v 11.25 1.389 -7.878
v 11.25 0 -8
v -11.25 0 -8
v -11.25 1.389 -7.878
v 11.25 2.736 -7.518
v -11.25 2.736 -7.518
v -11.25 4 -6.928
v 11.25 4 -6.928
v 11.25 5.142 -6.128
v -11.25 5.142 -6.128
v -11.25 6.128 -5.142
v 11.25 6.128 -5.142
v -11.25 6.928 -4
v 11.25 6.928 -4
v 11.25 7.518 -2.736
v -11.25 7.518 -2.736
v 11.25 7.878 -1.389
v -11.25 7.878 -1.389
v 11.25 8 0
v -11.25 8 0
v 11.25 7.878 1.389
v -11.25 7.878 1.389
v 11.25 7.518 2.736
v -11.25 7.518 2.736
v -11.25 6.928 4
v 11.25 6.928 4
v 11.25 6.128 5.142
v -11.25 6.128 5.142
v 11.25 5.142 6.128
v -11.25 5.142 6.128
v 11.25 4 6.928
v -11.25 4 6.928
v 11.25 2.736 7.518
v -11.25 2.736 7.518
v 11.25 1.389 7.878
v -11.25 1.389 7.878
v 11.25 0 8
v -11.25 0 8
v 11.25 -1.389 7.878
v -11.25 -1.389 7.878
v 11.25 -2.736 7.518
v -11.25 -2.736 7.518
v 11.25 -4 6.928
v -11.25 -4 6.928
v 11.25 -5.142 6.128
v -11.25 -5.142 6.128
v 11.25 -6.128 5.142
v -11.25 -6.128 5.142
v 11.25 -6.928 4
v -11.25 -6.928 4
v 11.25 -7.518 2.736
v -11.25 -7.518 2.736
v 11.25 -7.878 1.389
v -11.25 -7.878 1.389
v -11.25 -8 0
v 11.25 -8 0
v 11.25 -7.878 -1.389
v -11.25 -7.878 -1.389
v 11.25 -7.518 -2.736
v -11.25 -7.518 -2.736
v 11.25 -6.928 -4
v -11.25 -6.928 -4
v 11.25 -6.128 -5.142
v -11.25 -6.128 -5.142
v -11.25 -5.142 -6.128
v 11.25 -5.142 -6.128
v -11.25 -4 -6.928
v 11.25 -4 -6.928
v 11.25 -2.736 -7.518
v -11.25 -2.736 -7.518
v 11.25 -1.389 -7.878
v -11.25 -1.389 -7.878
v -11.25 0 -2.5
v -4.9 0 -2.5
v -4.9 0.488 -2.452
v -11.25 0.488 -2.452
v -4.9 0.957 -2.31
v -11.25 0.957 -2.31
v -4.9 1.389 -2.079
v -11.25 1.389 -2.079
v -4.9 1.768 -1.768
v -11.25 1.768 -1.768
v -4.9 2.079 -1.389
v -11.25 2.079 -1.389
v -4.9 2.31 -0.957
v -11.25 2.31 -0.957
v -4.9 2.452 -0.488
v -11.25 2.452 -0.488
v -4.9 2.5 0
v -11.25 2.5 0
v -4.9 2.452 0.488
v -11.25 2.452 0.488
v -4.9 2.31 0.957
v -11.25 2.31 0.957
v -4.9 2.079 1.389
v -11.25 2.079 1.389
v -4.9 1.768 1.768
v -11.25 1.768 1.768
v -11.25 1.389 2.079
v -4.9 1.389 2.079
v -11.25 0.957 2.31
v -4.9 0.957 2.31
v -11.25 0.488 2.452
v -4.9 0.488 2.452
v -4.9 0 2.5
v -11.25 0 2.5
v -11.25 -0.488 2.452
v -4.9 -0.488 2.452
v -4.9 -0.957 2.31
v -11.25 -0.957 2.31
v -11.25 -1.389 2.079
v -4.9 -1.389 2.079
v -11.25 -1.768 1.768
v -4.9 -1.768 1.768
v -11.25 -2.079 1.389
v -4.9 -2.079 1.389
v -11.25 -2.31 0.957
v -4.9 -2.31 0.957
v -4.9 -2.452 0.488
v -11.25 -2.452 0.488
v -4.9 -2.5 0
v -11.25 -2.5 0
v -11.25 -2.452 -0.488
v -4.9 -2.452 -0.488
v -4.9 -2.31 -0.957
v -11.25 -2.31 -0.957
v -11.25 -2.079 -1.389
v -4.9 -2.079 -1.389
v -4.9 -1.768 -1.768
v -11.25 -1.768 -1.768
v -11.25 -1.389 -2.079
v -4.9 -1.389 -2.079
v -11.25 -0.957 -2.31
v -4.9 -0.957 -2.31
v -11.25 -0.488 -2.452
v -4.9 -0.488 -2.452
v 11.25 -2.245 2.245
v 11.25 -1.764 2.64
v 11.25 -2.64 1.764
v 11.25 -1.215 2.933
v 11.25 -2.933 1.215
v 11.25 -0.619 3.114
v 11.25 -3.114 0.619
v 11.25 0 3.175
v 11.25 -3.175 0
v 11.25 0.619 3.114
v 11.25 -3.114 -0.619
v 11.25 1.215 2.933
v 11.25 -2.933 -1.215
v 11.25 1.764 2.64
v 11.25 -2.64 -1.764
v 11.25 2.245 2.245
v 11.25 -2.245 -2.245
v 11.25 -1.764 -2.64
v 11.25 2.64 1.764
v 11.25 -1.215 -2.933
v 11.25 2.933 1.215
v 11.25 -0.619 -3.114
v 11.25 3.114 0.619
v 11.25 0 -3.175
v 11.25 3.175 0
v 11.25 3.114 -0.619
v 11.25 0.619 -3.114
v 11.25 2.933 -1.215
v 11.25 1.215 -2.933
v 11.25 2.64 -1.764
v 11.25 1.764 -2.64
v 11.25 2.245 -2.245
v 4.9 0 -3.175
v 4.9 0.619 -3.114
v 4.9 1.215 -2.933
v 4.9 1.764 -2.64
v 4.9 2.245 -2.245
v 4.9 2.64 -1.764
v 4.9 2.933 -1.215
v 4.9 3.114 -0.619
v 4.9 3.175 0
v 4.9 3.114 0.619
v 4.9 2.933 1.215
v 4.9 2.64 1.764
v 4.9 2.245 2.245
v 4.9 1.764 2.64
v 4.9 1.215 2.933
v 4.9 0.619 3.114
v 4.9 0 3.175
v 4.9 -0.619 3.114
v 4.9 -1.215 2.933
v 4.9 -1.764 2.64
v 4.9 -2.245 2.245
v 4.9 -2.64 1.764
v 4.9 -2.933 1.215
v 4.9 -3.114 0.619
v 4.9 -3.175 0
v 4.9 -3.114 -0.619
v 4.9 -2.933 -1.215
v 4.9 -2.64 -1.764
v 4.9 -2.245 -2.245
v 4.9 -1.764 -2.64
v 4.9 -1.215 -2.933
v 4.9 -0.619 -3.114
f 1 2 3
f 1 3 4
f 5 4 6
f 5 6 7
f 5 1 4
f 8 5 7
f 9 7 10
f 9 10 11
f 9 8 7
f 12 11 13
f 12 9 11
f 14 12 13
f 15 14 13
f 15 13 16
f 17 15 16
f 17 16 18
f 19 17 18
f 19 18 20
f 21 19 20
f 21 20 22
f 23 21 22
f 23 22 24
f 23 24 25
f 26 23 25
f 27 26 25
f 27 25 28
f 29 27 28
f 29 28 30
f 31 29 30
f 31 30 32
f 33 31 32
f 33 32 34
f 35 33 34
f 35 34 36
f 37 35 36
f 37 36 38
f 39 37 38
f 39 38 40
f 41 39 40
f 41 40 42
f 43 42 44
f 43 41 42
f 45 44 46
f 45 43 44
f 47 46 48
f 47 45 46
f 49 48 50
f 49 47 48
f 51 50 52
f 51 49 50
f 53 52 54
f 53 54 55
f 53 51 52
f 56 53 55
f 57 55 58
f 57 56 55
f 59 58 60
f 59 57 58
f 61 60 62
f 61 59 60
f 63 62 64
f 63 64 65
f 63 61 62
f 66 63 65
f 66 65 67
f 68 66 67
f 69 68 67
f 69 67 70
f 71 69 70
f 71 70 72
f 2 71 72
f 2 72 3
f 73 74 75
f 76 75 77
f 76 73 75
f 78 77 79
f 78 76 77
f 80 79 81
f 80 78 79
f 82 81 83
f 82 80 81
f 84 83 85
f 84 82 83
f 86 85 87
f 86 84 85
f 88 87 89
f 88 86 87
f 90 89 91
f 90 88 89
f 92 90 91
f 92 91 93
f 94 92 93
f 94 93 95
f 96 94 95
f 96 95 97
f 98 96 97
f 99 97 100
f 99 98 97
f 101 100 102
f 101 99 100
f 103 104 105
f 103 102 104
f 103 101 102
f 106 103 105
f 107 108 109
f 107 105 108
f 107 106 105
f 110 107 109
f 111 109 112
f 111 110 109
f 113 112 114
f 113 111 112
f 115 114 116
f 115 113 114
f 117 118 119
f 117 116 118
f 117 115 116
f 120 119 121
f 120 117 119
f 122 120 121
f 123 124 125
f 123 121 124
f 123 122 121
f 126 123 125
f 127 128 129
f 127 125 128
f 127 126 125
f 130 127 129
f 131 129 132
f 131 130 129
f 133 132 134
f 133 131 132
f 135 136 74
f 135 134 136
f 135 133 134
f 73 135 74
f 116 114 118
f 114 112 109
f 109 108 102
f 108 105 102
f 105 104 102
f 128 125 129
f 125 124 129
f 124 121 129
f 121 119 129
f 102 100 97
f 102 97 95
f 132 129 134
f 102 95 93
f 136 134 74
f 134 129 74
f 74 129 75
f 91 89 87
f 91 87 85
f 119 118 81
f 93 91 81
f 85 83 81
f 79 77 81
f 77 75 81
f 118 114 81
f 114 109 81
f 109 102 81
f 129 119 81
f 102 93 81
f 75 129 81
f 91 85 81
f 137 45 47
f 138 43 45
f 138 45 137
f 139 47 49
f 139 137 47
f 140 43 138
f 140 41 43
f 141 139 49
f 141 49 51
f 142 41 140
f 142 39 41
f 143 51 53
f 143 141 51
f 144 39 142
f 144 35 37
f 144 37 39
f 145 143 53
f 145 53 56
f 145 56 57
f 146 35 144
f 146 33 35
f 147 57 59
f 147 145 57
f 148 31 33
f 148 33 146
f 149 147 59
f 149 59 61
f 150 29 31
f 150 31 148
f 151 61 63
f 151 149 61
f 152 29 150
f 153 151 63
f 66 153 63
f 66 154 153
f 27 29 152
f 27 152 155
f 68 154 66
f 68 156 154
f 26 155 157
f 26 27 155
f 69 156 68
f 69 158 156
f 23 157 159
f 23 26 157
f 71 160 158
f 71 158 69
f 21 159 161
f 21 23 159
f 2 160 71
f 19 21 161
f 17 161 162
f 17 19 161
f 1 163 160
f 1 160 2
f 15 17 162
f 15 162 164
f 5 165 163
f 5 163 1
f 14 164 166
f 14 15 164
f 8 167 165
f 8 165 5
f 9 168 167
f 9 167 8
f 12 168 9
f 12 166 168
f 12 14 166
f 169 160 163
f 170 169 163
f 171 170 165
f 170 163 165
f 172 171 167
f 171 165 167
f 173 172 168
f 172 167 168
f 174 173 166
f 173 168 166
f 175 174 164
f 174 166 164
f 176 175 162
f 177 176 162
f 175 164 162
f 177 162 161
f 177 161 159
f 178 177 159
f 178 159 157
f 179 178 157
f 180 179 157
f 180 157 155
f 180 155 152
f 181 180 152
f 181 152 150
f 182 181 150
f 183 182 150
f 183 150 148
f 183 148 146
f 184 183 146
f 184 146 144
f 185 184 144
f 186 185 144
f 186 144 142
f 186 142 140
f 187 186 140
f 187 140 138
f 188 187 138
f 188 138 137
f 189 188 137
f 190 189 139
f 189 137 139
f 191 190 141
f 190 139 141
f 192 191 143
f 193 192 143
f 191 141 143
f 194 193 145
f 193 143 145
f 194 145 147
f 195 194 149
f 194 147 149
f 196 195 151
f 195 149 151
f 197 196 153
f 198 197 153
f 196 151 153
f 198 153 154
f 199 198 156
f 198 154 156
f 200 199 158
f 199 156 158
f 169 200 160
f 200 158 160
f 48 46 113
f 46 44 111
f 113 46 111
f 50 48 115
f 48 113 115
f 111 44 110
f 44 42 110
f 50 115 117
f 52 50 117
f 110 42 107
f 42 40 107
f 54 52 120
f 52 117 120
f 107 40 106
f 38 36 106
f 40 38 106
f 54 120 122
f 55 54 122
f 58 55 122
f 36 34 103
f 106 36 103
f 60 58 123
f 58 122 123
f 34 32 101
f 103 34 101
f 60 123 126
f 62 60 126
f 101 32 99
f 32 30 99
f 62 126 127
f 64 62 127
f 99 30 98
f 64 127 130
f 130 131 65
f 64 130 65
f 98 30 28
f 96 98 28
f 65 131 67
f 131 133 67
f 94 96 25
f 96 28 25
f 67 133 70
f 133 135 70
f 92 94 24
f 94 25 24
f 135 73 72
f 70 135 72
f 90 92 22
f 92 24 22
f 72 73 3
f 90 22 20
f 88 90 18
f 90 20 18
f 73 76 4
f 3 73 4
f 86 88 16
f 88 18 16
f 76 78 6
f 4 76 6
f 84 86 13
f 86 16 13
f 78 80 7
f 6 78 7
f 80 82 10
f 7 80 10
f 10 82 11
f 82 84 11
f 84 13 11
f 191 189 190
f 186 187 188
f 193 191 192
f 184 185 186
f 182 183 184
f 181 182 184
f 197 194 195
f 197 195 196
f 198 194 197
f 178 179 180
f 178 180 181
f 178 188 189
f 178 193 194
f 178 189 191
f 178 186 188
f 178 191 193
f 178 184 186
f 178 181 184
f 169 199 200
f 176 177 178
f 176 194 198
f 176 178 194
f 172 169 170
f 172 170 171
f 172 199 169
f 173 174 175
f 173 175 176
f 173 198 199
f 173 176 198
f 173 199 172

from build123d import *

# Parameters (mm, degrees)
SKETCH1_R                = 8
SKETCH1_R_2              = 2.5
BOSS_EXTRUDE1_DEPTH      = 11.25
SKETCH2_R                = 3.175
CUT_EXTRUDE1_DEPTH       = 11.25
SKETCH3_R                = 8
BOSS_EXTRUDE2_DEPTH      = 4.9
BOSS_EXTRUDE2_DEPTH_BACK = 4.9


with BuildPart() as part:
    # Sketch1 → Boss-Extrude1 (new body, symmetric)
    with BuildSketch(Plane(origin=(0, 0, 0), x_dir=(0, 0, -1), z_dir=(1, 0, 0))):
        Circle(SKETCH1_R)
        Circle(SKETCH1_R_2, mode=Mode.SUBTRACT)
    extrude(amount=BOSS_EXTRUDE1_DEPTH, both=True)

    # Sketch2 → Cut-Extrude1 (cut)
    with BuildSketch(Plane(origin=(11.25, 0, 0), x_dir=(0, 0, -1), z_dir=(1, 0, 0))):
        Circle(SKETCH2_R)
    extrude(amount=-CUT_EXTRUDE1_DEPTH, mode=Mode.SUBTRACT)

    # Sketch3 → Boss-Extrude2 (add, two sides)
    with BuildSketch(Plane(origin=(0, 0, 0), x_dir=(0, 0, -1), z_dir=(1, 0, 0))) as boss_extrude2_sk:
        Circle(SKETCH3_R)
    extrude(amount=BOSS_EXTRUDE2_DEPTH)
    extrude(boss_extrude2_sk.sketch, amount=-BOSS_EXTRUDE2_DEPTH_BACK)


solid = part.part
